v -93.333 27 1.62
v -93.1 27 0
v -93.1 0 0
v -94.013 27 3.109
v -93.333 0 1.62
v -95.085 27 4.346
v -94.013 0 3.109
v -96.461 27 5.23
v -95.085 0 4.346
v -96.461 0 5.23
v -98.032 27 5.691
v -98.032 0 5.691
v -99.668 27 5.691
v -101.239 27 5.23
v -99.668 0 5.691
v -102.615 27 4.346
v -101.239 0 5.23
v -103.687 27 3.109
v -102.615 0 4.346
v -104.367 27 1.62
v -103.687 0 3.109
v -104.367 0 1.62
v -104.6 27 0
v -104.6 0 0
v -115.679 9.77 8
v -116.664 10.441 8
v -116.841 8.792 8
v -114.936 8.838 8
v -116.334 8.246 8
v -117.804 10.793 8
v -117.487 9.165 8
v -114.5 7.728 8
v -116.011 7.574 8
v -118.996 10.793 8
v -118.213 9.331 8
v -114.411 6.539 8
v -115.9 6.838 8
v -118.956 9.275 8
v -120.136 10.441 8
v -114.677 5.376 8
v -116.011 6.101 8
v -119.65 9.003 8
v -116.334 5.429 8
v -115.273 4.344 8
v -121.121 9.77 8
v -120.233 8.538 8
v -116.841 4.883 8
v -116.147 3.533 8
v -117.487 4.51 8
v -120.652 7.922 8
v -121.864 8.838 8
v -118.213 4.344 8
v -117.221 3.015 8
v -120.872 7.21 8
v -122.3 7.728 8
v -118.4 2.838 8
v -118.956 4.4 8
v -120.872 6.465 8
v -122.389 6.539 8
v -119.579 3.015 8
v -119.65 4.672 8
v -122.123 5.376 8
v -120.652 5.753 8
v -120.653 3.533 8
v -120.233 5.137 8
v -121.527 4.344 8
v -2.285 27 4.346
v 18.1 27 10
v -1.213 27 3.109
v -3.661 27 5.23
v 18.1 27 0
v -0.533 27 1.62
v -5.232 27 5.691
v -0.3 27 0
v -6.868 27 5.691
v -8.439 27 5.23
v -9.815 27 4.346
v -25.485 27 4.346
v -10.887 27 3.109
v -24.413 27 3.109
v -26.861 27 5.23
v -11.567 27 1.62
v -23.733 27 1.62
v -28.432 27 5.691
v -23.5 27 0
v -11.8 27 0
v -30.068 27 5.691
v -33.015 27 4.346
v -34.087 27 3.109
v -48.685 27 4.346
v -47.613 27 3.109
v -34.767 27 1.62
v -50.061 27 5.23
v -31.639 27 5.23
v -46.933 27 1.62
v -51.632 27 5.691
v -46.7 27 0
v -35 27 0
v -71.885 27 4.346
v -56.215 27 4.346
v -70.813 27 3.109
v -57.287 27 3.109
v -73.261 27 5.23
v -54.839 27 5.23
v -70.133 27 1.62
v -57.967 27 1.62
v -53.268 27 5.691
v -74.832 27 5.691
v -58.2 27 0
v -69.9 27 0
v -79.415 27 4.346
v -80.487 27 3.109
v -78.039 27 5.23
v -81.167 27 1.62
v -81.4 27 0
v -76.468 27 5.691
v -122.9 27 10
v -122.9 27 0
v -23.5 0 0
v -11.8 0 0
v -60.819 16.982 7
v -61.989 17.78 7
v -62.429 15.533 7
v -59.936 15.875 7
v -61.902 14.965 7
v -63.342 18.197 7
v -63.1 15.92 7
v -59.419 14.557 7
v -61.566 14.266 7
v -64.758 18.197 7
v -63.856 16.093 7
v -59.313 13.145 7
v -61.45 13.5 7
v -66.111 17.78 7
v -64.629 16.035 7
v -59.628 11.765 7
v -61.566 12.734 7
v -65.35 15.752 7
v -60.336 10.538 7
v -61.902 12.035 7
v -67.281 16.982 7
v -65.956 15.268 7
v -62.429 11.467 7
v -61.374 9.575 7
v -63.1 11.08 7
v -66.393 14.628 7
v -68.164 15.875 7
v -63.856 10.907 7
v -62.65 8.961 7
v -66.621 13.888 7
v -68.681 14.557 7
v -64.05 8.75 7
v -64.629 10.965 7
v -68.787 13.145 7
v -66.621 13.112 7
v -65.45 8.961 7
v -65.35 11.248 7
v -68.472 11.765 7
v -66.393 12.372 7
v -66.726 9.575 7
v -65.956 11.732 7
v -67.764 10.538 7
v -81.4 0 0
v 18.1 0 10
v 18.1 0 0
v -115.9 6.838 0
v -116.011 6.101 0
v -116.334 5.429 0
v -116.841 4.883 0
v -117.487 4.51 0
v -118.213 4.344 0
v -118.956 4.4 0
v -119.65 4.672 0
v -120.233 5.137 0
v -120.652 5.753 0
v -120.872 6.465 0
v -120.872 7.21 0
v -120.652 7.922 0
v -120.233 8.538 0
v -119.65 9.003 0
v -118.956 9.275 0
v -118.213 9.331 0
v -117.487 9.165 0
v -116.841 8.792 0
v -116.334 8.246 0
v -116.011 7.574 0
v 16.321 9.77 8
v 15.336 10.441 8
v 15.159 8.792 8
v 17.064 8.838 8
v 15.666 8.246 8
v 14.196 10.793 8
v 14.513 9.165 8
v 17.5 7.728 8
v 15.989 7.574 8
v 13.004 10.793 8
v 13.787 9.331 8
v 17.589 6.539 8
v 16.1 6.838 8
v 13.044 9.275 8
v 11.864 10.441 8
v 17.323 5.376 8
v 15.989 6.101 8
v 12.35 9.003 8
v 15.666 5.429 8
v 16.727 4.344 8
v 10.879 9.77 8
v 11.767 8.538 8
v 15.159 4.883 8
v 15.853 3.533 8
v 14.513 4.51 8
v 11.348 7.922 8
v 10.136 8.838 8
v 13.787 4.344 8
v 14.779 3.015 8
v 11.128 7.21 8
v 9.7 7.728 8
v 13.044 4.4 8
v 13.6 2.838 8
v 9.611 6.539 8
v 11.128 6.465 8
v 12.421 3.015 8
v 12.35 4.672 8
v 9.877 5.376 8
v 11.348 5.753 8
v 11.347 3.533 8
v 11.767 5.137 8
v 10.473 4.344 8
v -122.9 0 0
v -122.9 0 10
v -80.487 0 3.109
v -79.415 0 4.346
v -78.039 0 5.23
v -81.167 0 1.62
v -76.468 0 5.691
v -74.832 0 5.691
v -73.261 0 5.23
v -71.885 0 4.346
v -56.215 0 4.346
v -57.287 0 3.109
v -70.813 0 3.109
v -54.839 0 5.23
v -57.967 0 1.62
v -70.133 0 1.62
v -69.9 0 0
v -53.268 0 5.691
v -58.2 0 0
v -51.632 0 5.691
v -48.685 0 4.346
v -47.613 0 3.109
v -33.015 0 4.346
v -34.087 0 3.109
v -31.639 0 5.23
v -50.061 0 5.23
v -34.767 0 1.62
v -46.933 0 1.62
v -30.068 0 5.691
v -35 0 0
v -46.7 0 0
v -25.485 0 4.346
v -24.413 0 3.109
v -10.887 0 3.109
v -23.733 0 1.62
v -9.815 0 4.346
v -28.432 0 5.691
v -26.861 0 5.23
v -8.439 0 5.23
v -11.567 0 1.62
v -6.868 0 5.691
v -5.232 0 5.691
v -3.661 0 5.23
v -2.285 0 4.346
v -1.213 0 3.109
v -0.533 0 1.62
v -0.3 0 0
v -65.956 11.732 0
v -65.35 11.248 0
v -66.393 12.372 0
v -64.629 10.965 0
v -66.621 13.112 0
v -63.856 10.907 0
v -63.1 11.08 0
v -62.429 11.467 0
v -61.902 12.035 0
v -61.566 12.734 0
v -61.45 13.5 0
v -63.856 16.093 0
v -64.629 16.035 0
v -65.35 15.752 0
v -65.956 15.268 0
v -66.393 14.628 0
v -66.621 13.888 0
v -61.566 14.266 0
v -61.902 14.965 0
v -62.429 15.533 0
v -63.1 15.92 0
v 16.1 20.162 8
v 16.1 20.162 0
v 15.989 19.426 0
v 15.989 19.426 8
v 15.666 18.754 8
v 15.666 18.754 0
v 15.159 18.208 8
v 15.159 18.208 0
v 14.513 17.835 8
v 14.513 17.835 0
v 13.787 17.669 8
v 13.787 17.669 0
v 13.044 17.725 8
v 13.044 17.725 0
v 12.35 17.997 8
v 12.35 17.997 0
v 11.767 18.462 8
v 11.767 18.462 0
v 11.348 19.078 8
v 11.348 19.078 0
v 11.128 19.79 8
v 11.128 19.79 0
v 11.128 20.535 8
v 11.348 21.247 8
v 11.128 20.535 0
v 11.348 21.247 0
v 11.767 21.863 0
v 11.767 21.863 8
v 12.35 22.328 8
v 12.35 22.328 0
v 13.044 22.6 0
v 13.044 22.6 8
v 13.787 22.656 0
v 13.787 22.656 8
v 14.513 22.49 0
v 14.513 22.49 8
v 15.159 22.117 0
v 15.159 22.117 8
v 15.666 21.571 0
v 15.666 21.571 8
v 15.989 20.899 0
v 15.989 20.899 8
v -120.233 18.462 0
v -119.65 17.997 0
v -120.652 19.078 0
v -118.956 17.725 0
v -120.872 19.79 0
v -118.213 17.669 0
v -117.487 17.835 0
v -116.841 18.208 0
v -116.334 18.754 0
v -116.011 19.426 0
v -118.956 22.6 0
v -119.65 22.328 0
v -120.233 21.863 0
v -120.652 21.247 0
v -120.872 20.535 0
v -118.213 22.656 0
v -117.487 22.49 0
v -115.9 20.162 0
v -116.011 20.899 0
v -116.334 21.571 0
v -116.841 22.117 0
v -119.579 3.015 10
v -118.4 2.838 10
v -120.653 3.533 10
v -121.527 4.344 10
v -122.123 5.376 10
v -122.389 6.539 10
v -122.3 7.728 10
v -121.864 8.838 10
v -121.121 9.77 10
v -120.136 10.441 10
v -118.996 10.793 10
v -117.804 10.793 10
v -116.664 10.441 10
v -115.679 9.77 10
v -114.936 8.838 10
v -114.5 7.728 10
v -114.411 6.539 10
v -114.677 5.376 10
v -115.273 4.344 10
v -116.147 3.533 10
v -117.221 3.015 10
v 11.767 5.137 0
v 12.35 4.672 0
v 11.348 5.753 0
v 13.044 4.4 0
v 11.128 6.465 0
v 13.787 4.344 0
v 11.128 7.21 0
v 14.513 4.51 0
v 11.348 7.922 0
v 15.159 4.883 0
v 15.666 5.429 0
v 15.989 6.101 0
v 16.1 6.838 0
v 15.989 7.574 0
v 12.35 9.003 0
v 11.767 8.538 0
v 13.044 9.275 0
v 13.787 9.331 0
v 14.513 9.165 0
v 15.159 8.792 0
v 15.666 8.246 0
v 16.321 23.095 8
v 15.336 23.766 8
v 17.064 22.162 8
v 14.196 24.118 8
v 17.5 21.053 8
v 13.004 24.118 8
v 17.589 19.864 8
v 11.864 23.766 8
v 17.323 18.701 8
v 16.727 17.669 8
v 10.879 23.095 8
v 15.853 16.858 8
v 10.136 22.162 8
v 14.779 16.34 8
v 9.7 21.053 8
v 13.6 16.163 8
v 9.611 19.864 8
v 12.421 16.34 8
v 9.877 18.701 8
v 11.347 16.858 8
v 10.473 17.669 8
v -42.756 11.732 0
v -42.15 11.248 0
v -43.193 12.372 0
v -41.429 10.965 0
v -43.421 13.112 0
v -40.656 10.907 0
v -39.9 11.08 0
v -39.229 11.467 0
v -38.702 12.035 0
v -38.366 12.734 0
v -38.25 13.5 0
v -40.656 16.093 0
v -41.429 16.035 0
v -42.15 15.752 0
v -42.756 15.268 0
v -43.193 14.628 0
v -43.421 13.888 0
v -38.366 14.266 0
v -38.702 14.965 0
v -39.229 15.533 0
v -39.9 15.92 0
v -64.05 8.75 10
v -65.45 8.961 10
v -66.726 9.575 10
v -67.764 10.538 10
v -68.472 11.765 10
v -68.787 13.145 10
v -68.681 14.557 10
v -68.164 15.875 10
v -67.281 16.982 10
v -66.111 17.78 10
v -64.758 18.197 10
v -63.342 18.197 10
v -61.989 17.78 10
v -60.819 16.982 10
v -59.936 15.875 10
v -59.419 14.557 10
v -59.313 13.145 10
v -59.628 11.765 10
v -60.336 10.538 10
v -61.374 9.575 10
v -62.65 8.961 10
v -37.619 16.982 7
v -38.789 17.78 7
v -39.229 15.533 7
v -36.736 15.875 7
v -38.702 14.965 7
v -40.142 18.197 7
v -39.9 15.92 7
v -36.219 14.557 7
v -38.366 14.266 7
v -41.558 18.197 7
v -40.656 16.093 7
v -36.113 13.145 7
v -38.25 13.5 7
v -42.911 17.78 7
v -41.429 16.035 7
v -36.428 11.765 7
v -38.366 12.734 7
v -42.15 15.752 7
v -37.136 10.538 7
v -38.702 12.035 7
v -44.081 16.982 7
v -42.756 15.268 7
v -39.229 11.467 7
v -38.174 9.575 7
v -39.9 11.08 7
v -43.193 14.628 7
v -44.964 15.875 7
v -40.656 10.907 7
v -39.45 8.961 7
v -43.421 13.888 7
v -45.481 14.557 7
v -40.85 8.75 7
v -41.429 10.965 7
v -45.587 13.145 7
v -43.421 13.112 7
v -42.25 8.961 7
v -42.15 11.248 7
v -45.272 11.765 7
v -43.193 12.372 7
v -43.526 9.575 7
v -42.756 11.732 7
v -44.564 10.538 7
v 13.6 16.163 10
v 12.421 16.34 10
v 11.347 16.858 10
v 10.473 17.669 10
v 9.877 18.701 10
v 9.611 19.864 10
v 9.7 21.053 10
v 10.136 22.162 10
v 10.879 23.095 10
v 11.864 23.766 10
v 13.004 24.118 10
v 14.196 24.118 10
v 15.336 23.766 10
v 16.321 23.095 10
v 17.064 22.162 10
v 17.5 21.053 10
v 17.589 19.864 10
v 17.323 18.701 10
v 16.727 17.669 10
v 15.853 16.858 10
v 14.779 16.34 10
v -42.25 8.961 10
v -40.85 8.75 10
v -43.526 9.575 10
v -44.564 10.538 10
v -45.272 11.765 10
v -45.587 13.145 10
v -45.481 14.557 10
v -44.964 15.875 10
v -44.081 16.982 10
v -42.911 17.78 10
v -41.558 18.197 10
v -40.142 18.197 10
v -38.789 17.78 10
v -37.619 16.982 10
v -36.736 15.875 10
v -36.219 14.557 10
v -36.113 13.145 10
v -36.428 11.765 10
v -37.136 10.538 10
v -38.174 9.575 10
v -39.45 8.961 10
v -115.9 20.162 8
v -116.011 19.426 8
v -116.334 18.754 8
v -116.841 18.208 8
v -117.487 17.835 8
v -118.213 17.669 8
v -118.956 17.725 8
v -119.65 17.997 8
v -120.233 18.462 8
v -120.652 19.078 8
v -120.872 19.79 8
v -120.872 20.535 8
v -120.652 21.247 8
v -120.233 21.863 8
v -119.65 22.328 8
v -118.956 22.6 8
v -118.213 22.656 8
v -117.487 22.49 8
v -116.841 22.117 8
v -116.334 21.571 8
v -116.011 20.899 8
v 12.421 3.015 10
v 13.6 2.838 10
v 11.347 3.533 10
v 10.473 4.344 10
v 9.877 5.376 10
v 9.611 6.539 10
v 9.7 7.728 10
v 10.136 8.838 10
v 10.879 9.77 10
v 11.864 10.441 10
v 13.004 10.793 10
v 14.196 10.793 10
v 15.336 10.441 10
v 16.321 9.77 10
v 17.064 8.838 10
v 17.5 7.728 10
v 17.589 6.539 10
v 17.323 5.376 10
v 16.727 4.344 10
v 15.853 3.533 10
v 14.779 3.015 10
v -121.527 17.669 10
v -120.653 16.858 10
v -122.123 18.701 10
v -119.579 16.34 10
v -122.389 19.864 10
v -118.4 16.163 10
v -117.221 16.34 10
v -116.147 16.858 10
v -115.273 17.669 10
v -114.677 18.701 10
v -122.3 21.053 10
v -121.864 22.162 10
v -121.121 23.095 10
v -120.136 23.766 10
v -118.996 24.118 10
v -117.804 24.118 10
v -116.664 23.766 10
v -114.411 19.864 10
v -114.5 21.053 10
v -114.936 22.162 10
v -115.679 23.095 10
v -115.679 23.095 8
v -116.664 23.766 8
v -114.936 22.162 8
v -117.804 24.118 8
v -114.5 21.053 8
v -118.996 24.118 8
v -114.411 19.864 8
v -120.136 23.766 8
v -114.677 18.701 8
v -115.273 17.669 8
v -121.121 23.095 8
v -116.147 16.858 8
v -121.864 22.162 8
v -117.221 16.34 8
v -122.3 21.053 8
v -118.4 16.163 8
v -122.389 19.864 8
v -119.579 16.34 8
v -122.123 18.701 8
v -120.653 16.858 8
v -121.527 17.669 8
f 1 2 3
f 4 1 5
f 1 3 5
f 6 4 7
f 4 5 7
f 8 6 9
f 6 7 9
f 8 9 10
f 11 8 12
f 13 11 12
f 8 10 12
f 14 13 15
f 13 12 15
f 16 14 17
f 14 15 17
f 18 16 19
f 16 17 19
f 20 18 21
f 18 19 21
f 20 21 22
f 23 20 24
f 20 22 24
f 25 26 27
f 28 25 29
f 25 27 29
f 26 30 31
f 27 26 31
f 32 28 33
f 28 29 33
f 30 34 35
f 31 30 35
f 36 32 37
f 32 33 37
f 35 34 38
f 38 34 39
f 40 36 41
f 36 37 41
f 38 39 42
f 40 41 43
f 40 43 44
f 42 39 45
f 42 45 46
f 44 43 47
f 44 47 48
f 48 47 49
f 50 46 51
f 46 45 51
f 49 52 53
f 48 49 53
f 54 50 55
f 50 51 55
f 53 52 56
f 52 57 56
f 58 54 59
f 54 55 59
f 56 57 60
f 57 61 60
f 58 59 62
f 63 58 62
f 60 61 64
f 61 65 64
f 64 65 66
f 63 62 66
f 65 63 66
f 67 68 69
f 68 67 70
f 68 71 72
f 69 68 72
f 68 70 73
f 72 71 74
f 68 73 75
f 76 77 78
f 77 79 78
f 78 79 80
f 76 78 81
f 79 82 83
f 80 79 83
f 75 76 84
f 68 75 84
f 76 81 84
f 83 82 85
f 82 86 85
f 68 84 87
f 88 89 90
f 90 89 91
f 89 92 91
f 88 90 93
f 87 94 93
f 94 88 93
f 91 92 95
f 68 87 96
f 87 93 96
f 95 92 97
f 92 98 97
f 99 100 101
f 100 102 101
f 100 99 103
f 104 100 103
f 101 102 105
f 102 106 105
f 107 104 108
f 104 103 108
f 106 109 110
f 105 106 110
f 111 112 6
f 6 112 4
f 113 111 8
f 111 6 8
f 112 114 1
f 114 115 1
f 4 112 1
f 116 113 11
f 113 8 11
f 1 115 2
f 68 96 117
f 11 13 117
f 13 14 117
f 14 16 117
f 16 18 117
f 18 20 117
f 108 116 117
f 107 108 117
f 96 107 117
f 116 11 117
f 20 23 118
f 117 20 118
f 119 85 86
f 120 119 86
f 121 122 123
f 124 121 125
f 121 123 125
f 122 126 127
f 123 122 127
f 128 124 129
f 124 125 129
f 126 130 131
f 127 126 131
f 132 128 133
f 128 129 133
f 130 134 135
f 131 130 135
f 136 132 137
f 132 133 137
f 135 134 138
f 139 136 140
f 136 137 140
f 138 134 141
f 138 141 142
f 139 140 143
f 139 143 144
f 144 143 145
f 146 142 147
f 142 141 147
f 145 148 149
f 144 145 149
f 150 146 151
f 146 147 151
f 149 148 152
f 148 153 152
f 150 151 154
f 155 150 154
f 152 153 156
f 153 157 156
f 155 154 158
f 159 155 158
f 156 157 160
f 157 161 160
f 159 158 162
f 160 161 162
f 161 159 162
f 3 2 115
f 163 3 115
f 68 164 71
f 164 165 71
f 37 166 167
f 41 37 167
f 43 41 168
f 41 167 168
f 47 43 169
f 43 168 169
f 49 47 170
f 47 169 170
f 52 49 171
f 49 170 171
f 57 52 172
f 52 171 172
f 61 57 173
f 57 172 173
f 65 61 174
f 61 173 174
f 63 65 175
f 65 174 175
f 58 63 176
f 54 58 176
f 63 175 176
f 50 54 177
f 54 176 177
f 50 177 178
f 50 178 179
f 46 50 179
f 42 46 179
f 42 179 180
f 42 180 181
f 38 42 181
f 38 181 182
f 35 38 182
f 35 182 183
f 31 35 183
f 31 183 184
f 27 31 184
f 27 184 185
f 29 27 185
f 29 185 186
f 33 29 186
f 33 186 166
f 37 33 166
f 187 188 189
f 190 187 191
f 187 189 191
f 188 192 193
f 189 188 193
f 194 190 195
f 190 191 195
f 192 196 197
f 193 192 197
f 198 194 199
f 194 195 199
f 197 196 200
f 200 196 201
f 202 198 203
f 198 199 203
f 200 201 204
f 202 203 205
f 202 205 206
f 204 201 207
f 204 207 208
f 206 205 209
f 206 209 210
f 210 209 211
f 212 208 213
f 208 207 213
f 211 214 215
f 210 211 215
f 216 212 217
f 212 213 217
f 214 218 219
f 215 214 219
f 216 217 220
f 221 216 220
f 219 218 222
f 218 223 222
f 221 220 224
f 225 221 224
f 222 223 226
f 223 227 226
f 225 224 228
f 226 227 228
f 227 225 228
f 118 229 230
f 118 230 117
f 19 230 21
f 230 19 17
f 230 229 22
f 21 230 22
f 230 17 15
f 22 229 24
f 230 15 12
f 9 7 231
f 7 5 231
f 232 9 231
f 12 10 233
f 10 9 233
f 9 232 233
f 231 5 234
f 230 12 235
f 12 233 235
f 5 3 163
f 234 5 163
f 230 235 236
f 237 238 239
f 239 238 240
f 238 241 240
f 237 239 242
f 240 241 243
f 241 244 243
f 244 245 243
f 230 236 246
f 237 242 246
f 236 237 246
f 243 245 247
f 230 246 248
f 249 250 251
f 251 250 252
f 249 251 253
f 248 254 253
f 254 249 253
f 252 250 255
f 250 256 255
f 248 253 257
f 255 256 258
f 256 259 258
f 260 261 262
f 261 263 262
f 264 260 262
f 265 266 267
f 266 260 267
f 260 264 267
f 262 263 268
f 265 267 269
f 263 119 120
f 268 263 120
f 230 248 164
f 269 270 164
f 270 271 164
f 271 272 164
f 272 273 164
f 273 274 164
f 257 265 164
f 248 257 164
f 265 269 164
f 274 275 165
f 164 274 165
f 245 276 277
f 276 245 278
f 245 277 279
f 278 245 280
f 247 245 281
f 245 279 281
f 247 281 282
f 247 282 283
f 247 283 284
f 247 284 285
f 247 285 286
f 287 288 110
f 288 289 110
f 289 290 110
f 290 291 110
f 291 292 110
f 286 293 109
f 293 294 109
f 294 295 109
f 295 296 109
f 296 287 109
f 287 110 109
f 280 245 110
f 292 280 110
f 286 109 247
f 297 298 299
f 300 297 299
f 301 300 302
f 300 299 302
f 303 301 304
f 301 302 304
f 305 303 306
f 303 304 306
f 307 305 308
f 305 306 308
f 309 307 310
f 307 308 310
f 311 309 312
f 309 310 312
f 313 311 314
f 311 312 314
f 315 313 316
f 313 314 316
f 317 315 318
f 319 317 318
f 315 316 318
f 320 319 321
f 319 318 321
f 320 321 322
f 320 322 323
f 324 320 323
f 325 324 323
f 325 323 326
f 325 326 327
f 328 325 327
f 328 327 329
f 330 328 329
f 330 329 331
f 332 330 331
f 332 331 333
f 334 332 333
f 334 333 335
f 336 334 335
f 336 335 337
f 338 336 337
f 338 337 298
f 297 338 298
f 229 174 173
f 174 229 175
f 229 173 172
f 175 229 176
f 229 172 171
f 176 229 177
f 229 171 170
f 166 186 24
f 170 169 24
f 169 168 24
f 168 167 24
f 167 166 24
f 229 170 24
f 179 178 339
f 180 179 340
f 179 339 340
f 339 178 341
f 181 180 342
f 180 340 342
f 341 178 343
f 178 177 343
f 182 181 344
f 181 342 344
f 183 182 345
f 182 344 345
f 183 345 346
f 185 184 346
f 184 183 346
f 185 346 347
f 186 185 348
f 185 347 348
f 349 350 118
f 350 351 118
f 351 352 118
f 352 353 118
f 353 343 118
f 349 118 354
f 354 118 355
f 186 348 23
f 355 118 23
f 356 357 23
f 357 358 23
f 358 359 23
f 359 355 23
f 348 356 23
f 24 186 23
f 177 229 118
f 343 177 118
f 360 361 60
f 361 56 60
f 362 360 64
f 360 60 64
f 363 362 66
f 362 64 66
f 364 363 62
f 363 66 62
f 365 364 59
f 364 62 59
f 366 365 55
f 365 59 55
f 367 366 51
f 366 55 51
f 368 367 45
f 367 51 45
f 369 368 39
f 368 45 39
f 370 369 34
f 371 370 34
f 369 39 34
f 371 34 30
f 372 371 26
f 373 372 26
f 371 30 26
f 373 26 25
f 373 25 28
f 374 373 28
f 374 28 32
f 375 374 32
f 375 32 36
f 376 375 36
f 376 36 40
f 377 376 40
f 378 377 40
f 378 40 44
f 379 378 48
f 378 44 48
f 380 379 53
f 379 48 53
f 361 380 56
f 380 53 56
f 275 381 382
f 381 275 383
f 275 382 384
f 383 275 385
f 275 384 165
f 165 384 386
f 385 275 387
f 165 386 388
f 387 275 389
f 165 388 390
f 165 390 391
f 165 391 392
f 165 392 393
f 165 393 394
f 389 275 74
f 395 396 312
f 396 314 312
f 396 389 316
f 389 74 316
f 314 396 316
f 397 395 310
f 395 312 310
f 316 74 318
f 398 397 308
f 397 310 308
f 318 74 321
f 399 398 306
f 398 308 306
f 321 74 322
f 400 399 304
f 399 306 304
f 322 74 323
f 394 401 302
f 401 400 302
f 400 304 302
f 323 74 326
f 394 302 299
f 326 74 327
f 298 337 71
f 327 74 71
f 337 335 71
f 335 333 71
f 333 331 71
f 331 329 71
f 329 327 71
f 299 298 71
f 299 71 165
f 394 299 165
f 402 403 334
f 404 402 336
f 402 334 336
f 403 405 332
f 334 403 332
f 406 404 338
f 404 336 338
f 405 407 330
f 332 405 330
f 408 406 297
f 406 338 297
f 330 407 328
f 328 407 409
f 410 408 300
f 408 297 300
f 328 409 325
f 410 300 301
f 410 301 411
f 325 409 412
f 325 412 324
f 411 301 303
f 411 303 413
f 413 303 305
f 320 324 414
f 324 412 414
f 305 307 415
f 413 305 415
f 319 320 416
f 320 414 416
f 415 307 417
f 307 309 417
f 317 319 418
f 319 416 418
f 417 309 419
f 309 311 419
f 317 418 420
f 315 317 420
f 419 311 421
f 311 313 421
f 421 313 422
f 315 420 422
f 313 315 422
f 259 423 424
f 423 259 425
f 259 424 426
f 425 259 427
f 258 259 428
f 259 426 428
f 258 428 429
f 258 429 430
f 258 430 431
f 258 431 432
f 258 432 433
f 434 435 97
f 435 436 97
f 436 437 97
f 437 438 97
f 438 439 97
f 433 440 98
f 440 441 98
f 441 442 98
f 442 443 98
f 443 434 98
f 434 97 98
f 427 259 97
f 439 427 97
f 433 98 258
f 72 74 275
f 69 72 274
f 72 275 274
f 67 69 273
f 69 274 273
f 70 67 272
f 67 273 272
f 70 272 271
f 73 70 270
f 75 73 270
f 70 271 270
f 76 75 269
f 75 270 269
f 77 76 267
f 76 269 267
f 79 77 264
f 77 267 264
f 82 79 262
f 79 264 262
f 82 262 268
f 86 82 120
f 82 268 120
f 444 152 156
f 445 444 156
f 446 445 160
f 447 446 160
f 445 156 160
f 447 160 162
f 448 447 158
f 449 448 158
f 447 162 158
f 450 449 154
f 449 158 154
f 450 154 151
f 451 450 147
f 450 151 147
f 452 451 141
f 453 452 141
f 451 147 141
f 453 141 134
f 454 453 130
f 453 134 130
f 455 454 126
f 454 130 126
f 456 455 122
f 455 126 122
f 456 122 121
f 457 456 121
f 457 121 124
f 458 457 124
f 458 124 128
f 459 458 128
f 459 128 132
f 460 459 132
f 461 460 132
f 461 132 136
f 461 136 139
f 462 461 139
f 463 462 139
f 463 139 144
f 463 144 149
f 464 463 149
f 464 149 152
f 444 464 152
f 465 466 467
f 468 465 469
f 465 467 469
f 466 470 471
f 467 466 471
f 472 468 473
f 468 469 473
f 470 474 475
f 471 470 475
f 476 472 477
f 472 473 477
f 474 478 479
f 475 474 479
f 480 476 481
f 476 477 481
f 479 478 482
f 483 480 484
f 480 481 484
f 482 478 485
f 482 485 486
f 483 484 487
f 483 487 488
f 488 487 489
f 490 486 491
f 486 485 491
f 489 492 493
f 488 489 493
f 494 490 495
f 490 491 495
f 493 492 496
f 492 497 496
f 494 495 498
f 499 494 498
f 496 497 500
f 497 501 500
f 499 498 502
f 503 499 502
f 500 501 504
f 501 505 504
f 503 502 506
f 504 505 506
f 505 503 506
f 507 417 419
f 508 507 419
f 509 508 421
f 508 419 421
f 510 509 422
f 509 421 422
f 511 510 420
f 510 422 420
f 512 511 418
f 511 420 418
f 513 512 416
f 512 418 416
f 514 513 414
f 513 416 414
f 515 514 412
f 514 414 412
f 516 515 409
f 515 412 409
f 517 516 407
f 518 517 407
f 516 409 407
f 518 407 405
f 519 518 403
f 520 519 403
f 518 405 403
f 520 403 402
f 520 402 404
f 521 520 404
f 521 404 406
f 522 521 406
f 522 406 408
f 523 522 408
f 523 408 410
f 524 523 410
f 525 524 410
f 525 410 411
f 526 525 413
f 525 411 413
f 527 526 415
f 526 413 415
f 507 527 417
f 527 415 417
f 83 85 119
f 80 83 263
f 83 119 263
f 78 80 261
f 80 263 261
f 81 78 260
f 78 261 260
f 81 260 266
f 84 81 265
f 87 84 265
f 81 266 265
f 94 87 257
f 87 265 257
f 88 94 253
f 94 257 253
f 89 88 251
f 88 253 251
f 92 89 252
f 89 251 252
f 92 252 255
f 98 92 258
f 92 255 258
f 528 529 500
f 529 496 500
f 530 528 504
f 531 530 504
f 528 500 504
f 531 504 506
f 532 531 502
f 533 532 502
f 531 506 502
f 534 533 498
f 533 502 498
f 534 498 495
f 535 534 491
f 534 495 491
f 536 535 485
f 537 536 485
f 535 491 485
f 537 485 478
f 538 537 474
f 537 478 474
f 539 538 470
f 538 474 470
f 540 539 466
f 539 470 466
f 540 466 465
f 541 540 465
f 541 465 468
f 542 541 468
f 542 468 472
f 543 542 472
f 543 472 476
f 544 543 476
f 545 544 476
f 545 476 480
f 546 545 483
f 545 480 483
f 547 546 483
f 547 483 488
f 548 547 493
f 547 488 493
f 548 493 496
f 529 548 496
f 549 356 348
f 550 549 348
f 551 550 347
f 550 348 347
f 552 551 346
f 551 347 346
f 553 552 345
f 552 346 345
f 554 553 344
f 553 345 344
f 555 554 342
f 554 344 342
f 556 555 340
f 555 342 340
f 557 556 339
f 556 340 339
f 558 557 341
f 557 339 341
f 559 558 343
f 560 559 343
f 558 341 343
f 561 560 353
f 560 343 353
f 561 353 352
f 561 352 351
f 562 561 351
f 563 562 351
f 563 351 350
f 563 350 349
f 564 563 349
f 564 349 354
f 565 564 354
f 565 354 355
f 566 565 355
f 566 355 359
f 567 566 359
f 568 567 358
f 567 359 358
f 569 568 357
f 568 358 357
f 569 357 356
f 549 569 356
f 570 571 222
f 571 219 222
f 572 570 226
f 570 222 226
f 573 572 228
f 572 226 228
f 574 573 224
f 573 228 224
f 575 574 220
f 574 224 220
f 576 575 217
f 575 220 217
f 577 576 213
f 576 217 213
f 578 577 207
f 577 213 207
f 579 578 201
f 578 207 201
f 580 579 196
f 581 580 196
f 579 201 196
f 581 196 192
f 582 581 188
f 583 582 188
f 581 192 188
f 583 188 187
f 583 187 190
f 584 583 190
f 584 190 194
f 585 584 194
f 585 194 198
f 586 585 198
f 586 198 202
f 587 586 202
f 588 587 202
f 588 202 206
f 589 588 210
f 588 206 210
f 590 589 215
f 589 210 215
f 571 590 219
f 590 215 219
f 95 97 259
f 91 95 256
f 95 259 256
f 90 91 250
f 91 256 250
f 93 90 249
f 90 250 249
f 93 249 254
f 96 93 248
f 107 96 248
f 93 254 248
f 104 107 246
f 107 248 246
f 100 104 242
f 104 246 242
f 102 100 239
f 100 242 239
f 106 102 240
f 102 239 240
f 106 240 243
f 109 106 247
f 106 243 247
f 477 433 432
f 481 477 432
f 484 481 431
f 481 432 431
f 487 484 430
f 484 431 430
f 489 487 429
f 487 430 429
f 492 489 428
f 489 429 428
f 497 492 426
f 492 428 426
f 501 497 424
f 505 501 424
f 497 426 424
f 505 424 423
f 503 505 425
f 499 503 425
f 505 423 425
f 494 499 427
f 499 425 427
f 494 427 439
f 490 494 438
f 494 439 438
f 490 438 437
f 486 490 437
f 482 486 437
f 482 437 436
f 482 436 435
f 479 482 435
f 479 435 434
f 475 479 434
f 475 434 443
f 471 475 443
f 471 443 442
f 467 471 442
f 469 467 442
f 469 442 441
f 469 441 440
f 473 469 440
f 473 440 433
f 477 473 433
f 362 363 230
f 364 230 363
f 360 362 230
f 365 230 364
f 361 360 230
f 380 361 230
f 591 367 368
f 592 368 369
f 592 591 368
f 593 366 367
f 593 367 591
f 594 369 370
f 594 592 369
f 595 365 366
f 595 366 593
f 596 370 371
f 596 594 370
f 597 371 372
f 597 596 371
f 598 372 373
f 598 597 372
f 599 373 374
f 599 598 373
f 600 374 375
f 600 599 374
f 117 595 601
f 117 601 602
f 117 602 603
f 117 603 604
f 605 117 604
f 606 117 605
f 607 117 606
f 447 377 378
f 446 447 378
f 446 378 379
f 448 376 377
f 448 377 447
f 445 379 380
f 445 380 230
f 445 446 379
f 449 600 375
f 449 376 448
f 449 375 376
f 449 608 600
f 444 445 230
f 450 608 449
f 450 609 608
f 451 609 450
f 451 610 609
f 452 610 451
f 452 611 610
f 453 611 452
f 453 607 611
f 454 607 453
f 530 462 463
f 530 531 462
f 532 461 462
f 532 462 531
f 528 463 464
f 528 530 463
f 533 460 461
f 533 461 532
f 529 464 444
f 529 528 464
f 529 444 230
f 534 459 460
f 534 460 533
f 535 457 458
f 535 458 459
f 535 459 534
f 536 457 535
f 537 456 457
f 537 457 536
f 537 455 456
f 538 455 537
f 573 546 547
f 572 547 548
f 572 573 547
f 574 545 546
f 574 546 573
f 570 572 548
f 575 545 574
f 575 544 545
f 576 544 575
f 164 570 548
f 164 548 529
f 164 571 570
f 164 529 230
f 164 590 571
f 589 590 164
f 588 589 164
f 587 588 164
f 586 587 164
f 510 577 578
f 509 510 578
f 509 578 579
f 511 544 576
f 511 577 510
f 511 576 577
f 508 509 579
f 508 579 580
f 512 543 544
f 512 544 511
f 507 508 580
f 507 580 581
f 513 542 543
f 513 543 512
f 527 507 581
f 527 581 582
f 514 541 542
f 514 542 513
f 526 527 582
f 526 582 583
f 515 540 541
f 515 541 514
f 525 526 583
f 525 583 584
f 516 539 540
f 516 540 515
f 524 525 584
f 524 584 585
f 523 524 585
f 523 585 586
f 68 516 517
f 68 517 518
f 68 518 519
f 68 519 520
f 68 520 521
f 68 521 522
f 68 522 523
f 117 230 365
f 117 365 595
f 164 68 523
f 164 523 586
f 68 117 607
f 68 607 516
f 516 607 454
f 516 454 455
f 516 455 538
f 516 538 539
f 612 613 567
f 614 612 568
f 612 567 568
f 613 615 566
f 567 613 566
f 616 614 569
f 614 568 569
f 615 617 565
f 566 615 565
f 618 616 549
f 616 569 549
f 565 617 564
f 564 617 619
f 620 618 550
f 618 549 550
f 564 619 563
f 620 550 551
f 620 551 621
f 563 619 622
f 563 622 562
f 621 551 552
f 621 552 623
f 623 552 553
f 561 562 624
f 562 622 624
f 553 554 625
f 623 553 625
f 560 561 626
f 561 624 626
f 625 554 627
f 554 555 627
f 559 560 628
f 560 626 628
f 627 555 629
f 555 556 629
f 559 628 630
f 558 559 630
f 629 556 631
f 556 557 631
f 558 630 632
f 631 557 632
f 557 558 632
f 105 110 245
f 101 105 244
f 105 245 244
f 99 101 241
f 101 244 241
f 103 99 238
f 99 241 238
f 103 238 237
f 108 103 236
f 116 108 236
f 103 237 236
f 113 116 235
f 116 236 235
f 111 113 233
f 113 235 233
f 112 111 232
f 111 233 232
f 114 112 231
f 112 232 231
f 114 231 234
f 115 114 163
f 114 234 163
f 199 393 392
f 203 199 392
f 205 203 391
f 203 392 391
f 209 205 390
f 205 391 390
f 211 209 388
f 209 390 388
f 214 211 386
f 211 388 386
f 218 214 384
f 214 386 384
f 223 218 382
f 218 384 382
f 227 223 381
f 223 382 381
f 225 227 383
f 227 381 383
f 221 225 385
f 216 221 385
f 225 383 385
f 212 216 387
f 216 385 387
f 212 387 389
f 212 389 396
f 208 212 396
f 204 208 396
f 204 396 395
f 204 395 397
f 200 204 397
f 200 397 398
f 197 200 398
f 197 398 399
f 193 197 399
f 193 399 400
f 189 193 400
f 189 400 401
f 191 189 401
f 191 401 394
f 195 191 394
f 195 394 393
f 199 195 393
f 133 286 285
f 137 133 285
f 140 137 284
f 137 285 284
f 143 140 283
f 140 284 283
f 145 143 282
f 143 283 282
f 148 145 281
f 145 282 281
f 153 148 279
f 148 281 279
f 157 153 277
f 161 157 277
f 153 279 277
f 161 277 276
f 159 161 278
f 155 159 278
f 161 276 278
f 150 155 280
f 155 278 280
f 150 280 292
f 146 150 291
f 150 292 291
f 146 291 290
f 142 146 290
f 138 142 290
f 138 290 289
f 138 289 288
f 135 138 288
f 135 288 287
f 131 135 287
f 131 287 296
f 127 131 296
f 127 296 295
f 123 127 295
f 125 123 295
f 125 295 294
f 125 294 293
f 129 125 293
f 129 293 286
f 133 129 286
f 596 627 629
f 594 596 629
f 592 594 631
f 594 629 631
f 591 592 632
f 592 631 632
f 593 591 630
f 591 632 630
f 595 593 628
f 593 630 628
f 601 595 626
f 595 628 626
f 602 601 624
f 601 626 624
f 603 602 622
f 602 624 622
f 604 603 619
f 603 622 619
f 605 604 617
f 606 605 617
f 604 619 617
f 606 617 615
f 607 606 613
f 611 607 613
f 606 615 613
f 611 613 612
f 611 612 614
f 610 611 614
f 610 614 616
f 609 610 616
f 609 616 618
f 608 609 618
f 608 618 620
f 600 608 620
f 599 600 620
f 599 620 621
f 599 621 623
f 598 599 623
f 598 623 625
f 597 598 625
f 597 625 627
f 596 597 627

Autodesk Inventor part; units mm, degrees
ref_plane "YZ Plane" through (0, 0, 0) normal (1, 0, 0) x (0, 1, 0)
ref_plane "XZ Plane" through (0, 0, 0) normal (0, 1, 0) x (-1, 0, 0)
ref_plane "XY Plane" through (0, 0, 0) normal (0, 0, 1) x (1, 0, 0)
sketch "Sketch1" plane through (0, 0, 0) normal (0, 0, 1) x (1, 0, 0)
  line L0 (18.1, 0) -> (18.1, 27) projected
  line L1 (18.1, 27) -> (-0.25, 27) projected
  line L2 (0, 0) -> (18.1, 0)
  circle A0 centre (13.6, 6.8375) radius 2.5 projected
  circle A1 centre (13.6, 20.1625) radius 2.5 projected
  line L3 (-104.55, 27) -> (-122.9, 27) projected
  line L4 (-122.9, 0) -> (-122.9, 27) projected
  line L5 (-104.55, 0) -> (-122.9, 0) projected
  circle A2 centre (-118.4, 6.8375) radius 2.5 projected
  circle A3 centre (-118.4, 20.1625) radius 2.5 projected
  line L6 (-104.55, 27) -> (-0.25, 27)
  line L7 (-104.55, 0) -> (0, 0)
extrude "Extrusion1" add sketch "Sketch1" along normal blind 10
hole "Hole1" at (13.6, 20.1625, 10) direction (0, 0, -1) diameter 8 depth 2
hole "Hole2" at (13.6, 6.8375, 10) direction (0, 0, -1) diameter 8 depth 2
hole "Hole3" at (-118.4, 20.1625, 10) direction (0, 0, -1) diameter 8 depth 2
hole "Hole4" at (-118.4, 6.8375, 10) direction (0, 0, -1) diameter 8 depth 2
chamfer "Chamfer1" [suppressed]
sketch "Sketch2" plane through (0, 0, 0) normal (0, 1, 0) x (-1, 0, 0)
  line L0 (-18.1, 0) -> (104.6, 0) construction
  circle A0 centre (6.05, 0) radius 5.75
  circle A1 centre (29.25, 0) radius 5.75
  circle A2 centre (52.45, 0) radius 5.75
  circle A3 centre (29.25, 0) radius 5.75
  circle A4 centre (75.65, 0) radius 5.75
  circle A5 centre (98.85, 0) radius 5.75
  line L1 (-18.1, 0) -> (0, 0) construction
  line L2 (122.9, 0) -> (122.9, 10) projected
  line L3 (122.9, 0) -> (122.9, 10) projected
  line L4 (-18.1, 0) -> (-18.1, 10) projected
  line L5 (-18.1, 0) -> (-18.1, 10) projected
  dimension "d49" = 11.5
  dimension "d50" = 23.2
  dimension "d51" = 23.2
  dimension "d52" = 23.2
  dimension "d54" = 23.2
  dimension "d55" = 23.2
extrude "Extrusion2" cut sketch "Sketch2" along normal through all
sketch "Sketch3" plane through (0, 0, 0) normal (0, 0, 1) x (1, 0, 0)
  line L0 (-69.9, 0) -> (-69.9, 27) projected
  line L1 (-58.2, 27) -> (-69.9, 27) projected
  line L2 (-58.2, 27) -> (-58.2, 0) projected
  line L3 (-69.9, 0) -> (-58.2, 0) projected
  line L4 (-35, 27) -> (-35, 0) projected
  line L5 (-46.7, 0) -> (-35, 0) projected
  line L6 (-46.7, 0) -> (-46.7, 27) projected
  line L7 (-35, 27) -> (-46.7, 27) projected
  circle A0 centre (-64.05, 13.5) radius 2.6
  circle A1 centre (-40.85, 13.5) radius 2.6
  line L8 (-69.9, 0) -> (-69.9, 27) projected
  line L9 (-69.9, 13.5) -> (-35, 13.5) construction
  line L10 (-64.05, 0) -> (-64.05, 27) construction
  line L11 (-122.9, 0) -> (18.1, 0) projected
  line L12 (-40.85, 0) -> (-40.85, 27) construction
  point P0 (0, 0)
  point P1 (-40.85, 13.5)
  dimension "d66" = 5.2
extrude "Extrusion3" cut sketch "Sketch3" along normal through all contours A0 | A1
hole "Hole5" at (-40.85, 13.5, 10) direction (0, 0, -1) diameter 9.5 depth 3
hole "Hole6" at (-64.05, 13.5, 10) direction (0, 0, -1) diameter 9.5 depth 3
equation "\"d51\" = d50"
equation "\"d52\" = d50"
equation "\"d54\" = d50"
equation "\"d55\" = d50"
properties part number "cylinder-holder-1" material "Nylon 6/6"
